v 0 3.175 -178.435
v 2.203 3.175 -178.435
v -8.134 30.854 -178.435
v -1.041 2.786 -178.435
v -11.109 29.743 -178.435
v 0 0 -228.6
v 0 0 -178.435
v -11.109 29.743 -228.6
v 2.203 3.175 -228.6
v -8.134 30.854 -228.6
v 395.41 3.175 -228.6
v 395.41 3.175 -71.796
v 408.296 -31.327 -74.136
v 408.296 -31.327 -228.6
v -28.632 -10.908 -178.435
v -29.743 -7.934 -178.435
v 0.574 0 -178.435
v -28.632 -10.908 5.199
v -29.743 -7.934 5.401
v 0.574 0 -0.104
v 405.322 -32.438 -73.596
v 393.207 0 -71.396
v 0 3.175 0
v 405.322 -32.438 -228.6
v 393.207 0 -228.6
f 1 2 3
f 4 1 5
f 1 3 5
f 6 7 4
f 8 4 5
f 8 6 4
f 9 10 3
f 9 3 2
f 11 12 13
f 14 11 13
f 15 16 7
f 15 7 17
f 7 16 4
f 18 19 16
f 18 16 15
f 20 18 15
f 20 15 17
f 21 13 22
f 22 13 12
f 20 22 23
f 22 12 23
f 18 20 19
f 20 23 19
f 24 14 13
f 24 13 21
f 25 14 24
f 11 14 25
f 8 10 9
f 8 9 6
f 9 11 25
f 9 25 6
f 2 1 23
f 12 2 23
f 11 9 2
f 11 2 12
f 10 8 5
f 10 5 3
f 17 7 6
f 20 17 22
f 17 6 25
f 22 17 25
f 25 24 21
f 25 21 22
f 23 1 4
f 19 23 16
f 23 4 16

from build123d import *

# Parameters (mm, degrees)
SKETCH1_W           = 395.409928
SKETCH1_H           = 228.6
BOSS_EXTRUDE1_DEPTH = 3.175
CUT_EXTRUDE1_DEPTH  = 3.175
BOSS_EXTRUDE2_REACH = 458.746
BOSS_EXTRUDE3_DEPTH = 50.165
BOSS_EXTRUDE5_REACH = 448.763


with BuildPart() as part:
    # Sketch1 → Boss-Extrude1 (new body)
    with BuildSketch(Plane(origin=(0, 0, 0), x_dir=(1, 0, 0), z_dir=(0, 1, 0))):
        with Locations((197.704964, 114.3)):
            Rectangle(SKETCH1_W, SKETCH1_H)
    extrude(amount=BOSS_EXTRUDE1_DEPTH)

    # Sketch2 → Cut-Extrude1 (cut)
    with BuildSketch(Plane(origin=(0, 3.175, 0), x_dir=(1, 0, 0), z_dir=(0, 1, 0))):
        Polygon((0, 0), (395.409928, 71.795894), (395.409928, 0), align=None)
    extrude(amount=-CUT_EXTRUDE1_DEPTH, mode=Mode.SUBTRACT)

    # Boss-Extrude2: up to this plane
    boss_extrude2_end = Plane(origin=(0, 0, 0), z_dir=(-0.17865222161961358, 0, -0.9839122845611679))
    # Sketch3 → Boss-Extrude2 (add, up to the surface)
    with BuildSketch(Plane(origin=(0, 0, -228.6), x_dir=(-1, 0, 0), z_dir=(0, 0, -1)), mode=Mode.PRIVATE) as boss_extrude2_sk1:
        Polygon((-395.409928, 3.175), (-408.296023119, -31.327136928), (-405.32170097, -32.438007197), (-392.020710392, 3.175), align=None)
    boss_extrude2_tool1 = split(extrude(boss_extrude2_sk1.sketch, amount=-BOSS_EXTRUDE2_REACH, mode=Mode.PRIVATE), bisect_by=boss_extrude2_end, keep=Keep.BOTH, mode=Mode.PRIVATE)
    add(boss_extrude2_tool1.solids().sort_by_distance((400.253689, -14.355253, -228.6))[0])

    # Sketch4 → Boss-Extrude3 (add)
    with BuildSketch(Plane(origin=(0, 0, -228.6), x_dir=(-1, 0, 0), z_dir=(0, 0, -1))):
        Polygon((0, 0), (11.108702689, 29.743221489), (8.13438054, 30.854091758), (-3.389217608, 0), align=None)
    extrude(amount=-BOSS_EXTRUDE3_DEPTH)

    # Boss-Extrude5: up to this plane
    boss_extrude5_end = Plane(origin=(0, 0, 0), z_dir=(-0.17865222161961358, 0, -0.9839122845611679))
    # Sketch6 → Boss-Extrude5 (add, up to the surface)
    with BuildSketch(Plane.XY.offset(-178.435), mode=Mode.PRIVATE) as boss_extrude5_sk1:
        Polygon((0, 3.175), (-29.743221489, -7.933702689), (-28.63235122, -10.908024838), (9.074529477, 3.175), align=None)
    boss_extrude5_tool1 = split(extrude(boss_extrude5_sk1.sketch, amount=BOSS_EXTRUDE5_REACH, mode=Mode.PRIVATE), bisect_by=boss_extrude5_end, keep=Keep.BOTH, mode=Mode.PRIVATE)
    add(boss_extrude5_tool1.solids().sort_by_distance((-12.225047, -3.152196, -178.435))[0])


solid = part.part
